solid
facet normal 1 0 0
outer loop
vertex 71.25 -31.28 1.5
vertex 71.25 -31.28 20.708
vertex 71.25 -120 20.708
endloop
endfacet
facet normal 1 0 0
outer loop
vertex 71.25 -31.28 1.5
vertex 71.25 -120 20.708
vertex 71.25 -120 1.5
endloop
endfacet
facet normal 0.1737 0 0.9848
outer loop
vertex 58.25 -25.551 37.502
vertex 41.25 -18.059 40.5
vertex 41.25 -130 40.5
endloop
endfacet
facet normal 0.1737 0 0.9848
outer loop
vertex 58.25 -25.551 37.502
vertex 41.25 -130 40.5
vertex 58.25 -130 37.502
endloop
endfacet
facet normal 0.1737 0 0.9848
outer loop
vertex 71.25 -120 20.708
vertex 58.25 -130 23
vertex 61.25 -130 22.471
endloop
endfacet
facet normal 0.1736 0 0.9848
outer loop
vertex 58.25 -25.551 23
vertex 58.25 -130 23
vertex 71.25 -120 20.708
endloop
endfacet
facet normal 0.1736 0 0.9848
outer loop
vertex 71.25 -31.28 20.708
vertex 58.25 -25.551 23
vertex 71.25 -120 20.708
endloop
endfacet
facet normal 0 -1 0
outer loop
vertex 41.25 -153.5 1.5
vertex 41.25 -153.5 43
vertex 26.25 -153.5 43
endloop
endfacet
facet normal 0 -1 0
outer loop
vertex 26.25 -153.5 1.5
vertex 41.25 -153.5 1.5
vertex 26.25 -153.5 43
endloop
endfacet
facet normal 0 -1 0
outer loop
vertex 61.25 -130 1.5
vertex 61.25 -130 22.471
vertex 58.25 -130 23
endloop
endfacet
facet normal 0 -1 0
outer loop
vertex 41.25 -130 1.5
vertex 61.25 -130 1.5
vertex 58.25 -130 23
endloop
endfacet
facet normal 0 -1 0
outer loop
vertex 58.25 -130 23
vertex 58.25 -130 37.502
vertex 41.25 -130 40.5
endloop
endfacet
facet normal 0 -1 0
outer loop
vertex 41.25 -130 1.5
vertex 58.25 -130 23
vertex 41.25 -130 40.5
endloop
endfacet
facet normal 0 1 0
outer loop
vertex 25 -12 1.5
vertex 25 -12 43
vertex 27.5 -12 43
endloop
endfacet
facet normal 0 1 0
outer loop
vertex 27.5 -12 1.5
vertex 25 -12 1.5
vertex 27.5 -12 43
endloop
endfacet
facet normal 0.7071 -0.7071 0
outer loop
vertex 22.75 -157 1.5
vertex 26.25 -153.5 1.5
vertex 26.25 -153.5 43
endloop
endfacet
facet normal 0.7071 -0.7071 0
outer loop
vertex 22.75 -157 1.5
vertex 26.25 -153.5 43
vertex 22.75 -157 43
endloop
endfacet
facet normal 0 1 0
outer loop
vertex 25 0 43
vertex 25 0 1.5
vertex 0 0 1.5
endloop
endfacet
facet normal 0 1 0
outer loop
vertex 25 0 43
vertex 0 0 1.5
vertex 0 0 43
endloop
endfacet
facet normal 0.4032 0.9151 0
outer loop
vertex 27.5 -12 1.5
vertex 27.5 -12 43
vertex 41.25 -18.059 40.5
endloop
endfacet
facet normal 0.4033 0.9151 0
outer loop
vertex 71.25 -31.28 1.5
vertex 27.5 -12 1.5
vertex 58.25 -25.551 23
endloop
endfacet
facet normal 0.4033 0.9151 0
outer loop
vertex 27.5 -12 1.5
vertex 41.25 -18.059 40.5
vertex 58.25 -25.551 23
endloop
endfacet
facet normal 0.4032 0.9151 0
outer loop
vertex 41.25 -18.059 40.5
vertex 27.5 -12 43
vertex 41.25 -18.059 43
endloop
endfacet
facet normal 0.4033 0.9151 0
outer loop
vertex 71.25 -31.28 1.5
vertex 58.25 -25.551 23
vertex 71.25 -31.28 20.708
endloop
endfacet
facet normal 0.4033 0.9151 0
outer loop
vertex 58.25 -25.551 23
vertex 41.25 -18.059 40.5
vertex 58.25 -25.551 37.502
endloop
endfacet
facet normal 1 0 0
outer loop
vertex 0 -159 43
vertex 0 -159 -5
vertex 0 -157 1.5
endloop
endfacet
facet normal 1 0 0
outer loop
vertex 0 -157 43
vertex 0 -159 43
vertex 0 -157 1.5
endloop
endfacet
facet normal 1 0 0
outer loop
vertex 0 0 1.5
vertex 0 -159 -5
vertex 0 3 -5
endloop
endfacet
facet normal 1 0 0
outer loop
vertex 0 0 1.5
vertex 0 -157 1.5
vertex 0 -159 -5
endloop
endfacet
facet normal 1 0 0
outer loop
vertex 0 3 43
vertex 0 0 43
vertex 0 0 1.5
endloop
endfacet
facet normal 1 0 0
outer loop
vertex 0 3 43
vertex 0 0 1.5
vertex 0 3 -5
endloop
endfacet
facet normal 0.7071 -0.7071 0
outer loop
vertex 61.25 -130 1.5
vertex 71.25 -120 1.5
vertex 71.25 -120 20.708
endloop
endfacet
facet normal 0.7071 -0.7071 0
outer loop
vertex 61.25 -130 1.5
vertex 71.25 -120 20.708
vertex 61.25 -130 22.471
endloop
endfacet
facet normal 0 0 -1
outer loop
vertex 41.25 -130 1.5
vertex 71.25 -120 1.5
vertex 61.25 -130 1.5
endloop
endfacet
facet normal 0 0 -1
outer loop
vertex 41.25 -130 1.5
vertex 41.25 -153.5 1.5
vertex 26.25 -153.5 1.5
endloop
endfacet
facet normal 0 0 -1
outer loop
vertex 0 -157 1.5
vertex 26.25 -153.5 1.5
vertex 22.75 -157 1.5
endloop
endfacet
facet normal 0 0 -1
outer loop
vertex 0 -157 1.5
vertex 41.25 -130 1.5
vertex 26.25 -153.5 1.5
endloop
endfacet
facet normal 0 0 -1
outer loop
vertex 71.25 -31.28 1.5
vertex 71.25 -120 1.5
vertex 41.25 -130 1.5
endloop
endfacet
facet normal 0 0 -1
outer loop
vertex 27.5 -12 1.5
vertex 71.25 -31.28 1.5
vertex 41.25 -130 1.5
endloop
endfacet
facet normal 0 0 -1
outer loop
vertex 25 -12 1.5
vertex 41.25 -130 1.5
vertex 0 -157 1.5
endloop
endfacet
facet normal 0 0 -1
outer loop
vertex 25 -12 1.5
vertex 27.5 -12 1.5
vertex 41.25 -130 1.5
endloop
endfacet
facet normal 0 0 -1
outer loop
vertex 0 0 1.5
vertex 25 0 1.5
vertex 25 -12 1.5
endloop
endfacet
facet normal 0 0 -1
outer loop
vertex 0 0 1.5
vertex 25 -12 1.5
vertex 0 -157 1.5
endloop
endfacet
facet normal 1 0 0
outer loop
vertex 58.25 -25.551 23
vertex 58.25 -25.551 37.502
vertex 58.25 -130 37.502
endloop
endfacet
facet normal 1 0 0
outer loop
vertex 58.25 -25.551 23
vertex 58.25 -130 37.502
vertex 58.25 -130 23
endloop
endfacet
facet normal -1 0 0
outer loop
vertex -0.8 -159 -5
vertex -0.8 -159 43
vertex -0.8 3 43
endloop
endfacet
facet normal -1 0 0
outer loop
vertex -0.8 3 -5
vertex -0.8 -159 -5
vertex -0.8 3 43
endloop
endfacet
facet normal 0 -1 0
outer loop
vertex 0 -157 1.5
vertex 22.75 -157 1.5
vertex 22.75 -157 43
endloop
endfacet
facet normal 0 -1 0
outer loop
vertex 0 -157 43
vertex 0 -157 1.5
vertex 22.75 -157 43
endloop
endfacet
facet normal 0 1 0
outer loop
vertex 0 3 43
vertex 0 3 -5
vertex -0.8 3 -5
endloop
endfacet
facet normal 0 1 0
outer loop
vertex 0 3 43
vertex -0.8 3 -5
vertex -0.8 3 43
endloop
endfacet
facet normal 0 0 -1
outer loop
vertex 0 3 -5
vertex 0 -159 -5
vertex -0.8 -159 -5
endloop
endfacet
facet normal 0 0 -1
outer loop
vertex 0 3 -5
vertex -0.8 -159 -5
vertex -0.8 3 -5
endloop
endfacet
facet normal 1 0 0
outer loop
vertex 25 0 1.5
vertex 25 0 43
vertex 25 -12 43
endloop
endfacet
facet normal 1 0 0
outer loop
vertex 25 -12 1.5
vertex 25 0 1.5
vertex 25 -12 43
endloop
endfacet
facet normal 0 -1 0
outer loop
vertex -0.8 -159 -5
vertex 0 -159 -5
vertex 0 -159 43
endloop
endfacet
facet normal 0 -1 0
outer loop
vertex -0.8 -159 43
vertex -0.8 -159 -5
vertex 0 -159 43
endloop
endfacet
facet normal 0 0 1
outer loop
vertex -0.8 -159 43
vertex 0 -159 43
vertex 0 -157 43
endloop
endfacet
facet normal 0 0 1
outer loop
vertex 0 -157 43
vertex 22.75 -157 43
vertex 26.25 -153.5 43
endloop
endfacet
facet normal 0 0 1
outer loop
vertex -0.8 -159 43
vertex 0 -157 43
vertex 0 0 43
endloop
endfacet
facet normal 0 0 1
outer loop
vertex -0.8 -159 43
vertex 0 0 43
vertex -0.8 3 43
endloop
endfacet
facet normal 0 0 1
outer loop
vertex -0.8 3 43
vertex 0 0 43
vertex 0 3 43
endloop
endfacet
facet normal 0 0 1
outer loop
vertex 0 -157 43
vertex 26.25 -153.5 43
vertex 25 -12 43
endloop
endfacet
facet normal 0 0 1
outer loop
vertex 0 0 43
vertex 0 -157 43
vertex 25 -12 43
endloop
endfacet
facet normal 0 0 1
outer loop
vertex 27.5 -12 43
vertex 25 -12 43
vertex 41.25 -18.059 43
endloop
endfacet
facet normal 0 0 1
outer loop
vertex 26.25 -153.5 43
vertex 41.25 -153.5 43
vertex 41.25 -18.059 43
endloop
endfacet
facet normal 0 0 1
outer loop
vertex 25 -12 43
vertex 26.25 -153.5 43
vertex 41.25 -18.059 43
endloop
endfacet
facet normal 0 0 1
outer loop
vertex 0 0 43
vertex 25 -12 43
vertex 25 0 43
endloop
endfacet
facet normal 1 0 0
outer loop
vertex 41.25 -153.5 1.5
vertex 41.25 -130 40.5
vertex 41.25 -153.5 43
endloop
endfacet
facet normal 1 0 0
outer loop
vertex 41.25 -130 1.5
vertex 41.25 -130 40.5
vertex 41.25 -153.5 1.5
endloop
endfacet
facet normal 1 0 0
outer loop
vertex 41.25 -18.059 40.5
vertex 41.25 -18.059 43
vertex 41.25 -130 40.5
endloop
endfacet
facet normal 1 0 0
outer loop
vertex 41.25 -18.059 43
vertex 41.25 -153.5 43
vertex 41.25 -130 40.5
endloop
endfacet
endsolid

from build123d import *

# Parameters (mm, degrees)
SKETCH006_W     = 162
SKETCH006_H     = 48
PAD005_DEPTH    = 0.8
PAD006_DEPTH    = 157
POCKET001_DEPTH = 41.5


with BuildPart() as part:
    # Sketch006 → Pad005 (new body)
    with BuildSketch(Plane.YZ):
        with Locations((-78, 19)):
            Rectangle(SKETCH006_W, SKETCH006_H)
    extrude(amount=-PAD005_DEPTH)

    # Sketch007 (on DatumPlane) → Pad006 (join)
    with BuildSketch(Plane.ZX):
        Polygon((1.5, 0), (43, 0), (43, 41.25), (40.5, 41.25), (37.502441, 58.25), (23, 58.25), (20.707749, 71.25), (1.5, 71.25), align=None)
    extrude(amount=-PAD006_DEPTH)

    # Sketch008 (on Face5 of Pad006) → Pocket001 (cut)
    with BuildSketch(Plane(origin=(0, 0, 43), x_dir=(0, -1, 0), z_dir=(0, 0, 1))):
        Polygon((0, 25), (12, 25), (12, 27.5), (31.5, 71.75), (0, 71.75), align=None)
        Polygon((157, 22.75), (157, 71.25), (120, 71.25), (130, 61.25), (130, 41.25), (153.5, 41.25), (153.5, 26.25), align=None)
    extrude(amount=-POCKET001_DEPTH, mode=Mode.SUBTRACT)


solid = part.part
